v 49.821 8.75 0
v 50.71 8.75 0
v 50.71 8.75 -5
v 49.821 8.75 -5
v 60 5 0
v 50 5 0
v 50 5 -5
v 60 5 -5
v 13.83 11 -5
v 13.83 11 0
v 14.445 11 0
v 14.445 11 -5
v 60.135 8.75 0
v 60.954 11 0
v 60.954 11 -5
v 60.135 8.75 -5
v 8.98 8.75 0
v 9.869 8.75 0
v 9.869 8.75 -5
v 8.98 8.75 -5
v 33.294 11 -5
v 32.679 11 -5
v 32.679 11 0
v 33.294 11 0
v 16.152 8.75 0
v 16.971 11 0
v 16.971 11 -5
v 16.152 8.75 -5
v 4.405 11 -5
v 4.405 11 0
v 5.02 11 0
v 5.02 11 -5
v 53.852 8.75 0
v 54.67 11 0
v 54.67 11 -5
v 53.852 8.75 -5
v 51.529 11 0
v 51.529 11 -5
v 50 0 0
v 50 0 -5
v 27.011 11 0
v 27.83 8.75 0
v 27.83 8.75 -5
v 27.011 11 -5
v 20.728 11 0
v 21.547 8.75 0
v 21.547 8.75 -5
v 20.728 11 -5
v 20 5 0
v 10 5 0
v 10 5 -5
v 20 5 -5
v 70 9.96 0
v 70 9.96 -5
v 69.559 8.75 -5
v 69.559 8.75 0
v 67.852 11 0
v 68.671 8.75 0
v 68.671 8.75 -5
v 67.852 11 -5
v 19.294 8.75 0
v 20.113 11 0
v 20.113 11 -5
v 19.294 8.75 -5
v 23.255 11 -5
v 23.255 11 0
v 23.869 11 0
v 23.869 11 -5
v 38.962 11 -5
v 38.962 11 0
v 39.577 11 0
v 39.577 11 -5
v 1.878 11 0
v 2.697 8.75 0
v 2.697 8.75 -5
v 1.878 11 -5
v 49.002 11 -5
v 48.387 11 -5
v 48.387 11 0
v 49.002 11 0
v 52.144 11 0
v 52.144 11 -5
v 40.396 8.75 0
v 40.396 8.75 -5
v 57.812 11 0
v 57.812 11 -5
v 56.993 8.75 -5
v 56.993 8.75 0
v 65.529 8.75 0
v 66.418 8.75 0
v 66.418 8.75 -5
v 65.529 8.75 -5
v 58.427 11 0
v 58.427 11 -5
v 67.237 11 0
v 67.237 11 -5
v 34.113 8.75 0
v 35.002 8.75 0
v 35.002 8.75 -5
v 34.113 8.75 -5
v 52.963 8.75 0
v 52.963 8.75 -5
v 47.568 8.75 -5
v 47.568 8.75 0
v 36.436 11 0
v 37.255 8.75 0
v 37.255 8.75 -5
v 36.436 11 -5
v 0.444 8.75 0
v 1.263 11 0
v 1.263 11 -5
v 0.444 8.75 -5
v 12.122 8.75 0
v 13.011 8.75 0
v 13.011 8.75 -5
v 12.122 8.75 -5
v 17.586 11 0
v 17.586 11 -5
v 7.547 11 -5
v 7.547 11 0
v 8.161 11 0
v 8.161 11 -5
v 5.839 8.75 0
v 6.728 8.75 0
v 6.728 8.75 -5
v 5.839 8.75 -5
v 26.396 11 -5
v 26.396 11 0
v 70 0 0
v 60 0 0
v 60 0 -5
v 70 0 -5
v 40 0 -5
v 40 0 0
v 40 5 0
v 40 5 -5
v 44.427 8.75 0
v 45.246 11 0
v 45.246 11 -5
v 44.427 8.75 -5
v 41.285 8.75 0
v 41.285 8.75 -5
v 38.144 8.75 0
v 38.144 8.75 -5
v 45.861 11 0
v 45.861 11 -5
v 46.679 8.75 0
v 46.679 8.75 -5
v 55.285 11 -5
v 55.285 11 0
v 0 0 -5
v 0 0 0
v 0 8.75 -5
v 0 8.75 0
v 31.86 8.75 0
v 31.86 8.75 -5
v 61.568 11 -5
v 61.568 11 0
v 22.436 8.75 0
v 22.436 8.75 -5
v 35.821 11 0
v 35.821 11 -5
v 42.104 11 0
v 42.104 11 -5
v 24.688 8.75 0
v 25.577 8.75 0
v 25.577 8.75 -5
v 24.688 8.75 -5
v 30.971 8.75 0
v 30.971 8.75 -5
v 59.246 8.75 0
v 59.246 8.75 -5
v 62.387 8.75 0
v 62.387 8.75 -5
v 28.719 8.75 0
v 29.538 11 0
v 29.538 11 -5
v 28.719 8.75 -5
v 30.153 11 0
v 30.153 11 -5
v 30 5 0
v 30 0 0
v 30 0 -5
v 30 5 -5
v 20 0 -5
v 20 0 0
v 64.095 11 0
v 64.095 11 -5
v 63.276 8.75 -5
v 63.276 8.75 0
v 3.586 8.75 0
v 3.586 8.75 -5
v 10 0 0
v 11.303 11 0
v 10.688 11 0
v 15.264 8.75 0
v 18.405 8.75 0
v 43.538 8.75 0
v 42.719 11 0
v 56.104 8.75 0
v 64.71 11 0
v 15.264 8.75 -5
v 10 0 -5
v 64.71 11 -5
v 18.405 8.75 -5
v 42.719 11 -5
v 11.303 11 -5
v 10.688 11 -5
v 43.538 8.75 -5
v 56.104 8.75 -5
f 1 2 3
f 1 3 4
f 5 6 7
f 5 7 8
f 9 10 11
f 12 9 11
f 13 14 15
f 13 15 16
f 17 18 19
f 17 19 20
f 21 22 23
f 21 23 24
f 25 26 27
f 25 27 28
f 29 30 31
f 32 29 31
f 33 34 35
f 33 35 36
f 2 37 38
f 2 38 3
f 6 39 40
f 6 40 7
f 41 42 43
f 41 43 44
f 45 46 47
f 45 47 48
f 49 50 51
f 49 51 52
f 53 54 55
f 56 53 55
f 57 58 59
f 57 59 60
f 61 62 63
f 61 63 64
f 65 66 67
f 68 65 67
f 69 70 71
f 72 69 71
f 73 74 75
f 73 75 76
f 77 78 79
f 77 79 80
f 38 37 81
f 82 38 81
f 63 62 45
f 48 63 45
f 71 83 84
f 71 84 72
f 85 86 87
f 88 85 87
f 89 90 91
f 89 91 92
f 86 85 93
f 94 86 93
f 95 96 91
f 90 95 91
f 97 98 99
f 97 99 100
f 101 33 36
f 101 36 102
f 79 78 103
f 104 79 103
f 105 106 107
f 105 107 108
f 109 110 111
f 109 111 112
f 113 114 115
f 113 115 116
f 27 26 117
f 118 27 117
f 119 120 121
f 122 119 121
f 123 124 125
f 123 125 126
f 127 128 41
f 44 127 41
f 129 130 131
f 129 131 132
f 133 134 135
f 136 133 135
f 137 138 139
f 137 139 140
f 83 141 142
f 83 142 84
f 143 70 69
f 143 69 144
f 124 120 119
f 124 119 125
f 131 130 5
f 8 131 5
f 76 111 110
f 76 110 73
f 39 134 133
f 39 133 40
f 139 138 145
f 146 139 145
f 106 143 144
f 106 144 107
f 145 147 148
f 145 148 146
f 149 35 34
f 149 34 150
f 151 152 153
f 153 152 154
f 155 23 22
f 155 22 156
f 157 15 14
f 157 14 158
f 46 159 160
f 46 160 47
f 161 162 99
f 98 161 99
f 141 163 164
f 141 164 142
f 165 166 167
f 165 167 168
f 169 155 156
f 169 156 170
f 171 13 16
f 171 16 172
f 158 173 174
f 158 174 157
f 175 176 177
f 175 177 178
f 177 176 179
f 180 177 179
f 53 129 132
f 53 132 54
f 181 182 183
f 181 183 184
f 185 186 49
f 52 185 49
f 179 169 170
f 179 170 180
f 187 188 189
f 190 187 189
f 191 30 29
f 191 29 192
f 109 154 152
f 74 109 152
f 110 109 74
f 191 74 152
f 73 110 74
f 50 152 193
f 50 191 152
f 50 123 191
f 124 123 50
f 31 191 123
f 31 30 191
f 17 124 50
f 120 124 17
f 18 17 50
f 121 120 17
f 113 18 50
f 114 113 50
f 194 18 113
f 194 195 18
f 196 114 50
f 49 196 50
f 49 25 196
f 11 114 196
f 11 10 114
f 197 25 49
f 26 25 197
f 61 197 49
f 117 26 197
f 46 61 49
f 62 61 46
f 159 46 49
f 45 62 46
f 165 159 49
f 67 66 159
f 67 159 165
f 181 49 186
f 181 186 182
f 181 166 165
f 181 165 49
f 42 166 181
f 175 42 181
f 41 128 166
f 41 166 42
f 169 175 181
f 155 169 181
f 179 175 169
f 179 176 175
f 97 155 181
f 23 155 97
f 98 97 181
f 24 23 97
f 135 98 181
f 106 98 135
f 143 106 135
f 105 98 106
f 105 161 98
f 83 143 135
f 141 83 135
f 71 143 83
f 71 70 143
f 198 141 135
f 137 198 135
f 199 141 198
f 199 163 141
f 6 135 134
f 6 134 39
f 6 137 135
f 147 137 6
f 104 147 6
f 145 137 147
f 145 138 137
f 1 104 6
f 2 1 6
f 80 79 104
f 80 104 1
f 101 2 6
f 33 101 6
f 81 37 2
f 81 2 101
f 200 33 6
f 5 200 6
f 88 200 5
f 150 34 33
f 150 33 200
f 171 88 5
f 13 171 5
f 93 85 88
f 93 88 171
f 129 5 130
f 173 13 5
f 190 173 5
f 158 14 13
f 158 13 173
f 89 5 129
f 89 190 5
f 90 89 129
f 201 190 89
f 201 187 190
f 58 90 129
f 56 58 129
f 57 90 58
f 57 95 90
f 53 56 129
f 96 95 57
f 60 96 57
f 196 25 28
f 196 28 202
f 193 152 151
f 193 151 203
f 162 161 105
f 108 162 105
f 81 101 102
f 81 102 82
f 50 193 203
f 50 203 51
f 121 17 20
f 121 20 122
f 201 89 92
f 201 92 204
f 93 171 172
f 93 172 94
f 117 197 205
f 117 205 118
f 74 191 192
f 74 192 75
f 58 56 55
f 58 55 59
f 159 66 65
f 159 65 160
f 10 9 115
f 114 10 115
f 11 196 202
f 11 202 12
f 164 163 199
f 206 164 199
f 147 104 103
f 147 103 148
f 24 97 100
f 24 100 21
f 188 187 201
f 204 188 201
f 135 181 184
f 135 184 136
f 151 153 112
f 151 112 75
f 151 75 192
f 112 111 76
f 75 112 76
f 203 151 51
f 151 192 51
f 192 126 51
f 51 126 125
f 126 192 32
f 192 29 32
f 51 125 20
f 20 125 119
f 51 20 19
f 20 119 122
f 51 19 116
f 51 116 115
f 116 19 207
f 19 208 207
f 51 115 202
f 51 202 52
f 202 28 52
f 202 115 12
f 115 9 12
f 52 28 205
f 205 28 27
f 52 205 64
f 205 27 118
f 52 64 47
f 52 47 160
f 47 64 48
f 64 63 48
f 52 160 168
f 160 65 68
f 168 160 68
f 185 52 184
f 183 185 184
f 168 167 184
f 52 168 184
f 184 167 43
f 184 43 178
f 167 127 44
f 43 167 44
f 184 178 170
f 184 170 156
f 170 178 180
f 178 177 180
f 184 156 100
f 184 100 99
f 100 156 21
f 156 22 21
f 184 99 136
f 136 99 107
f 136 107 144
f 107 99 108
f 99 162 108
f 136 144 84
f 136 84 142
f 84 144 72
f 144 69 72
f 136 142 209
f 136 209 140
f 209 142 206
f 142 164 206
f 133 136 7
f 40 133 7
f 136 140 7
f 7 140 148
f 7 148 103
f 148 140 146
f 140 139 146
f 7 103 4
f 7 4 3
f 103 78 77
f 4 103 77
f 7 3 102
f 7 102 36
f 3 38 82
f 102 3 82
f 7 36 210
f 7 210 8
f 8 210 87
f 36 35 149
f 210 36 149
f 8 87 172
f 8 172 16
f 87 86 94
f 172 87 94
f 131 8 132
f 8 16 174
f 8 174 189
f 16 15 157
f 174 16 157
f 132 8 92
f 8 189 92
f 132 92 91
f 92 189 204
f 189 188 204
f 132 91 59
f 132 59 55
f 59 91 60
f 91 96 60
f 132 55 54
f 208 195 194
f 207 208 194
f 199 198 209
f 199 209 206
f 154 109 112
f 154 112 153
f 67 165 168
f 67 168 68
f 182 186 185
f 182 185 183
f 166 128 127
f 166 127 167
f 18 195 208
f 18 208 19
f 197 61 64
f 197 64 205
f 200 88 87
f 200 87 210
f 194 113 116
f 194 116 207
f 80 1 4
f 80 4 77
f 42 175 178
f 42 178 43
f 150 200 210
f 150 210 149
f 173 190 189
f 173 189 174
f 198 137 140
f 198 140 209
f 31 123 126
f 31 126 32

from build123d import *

# Parameters (mm, degrees)
BLANKSKE_W          = 70
BLANKSKE_H          = 11
BLANK_DEPTH         = 5
TOOTHCUTSIM_DEPTH   = 72.035202541
TEETHCUTS_COUNT     = 23
TEETHCUTS_PITCH     = 3.14159265
SKETCH_1_W          = 10
SKETCH_1_H          = 5
CUT_EXTRUDE_1_DEPTH = 72.035202541


with BuildPart() as part:
    # BlankSke → Blank (new body)
    with BuildSketch(Plane.XY):
        with Locations((35, 5.5)):
            Rectangle(BLANKSKE_W, BLANKSKE_H)
    extrude(amount=-BLANK_DEPTH)

    # TooCutSkeSim → ToothCutSim (cut, through all)
    with BuildSketch(Plane.XY):
        Polygon((0.44443537, 8.75), (-0.44443537, 8.75), (-1.272613241, 11.0254), (1.272613241, 11.0254), align=None)
    toothcutsim = extrude(amount=-TOOTHCUTSIM_DEPTH, mode=Mode.SUBTRACT)

    # TeethCuts: ToothCutSim ×23
    with Locations(*[(i * TEETHCUTS_PITCH, 0, 0) for i in range(1, TEETHCUTS_COUNT)]):
        add(toothcutsim, mode=Mode.SUBTRACT)

    # ｽｹｯﾁ1 → ｶｯﾄ - 押し出し1 (cut, through all)
    with BuildSketch(Plane.XY):
        with Locations((15, 2.5)):
            Rectangle(SKETCH_1_W, SKETCH_1_H)
        with Locations((35, 2.5)):
            Rectangle(SKETCH_1_W, SKETCH_1_H)
        with Locations((55, 2.5)):
            Rectangle(SKETCH_1_W, SKETCH_1_H)
    extrude(amount=-CUT_EXTRUDE_1_DEPTH, mode=Mode.SUBTRACT)


solid = part.part
